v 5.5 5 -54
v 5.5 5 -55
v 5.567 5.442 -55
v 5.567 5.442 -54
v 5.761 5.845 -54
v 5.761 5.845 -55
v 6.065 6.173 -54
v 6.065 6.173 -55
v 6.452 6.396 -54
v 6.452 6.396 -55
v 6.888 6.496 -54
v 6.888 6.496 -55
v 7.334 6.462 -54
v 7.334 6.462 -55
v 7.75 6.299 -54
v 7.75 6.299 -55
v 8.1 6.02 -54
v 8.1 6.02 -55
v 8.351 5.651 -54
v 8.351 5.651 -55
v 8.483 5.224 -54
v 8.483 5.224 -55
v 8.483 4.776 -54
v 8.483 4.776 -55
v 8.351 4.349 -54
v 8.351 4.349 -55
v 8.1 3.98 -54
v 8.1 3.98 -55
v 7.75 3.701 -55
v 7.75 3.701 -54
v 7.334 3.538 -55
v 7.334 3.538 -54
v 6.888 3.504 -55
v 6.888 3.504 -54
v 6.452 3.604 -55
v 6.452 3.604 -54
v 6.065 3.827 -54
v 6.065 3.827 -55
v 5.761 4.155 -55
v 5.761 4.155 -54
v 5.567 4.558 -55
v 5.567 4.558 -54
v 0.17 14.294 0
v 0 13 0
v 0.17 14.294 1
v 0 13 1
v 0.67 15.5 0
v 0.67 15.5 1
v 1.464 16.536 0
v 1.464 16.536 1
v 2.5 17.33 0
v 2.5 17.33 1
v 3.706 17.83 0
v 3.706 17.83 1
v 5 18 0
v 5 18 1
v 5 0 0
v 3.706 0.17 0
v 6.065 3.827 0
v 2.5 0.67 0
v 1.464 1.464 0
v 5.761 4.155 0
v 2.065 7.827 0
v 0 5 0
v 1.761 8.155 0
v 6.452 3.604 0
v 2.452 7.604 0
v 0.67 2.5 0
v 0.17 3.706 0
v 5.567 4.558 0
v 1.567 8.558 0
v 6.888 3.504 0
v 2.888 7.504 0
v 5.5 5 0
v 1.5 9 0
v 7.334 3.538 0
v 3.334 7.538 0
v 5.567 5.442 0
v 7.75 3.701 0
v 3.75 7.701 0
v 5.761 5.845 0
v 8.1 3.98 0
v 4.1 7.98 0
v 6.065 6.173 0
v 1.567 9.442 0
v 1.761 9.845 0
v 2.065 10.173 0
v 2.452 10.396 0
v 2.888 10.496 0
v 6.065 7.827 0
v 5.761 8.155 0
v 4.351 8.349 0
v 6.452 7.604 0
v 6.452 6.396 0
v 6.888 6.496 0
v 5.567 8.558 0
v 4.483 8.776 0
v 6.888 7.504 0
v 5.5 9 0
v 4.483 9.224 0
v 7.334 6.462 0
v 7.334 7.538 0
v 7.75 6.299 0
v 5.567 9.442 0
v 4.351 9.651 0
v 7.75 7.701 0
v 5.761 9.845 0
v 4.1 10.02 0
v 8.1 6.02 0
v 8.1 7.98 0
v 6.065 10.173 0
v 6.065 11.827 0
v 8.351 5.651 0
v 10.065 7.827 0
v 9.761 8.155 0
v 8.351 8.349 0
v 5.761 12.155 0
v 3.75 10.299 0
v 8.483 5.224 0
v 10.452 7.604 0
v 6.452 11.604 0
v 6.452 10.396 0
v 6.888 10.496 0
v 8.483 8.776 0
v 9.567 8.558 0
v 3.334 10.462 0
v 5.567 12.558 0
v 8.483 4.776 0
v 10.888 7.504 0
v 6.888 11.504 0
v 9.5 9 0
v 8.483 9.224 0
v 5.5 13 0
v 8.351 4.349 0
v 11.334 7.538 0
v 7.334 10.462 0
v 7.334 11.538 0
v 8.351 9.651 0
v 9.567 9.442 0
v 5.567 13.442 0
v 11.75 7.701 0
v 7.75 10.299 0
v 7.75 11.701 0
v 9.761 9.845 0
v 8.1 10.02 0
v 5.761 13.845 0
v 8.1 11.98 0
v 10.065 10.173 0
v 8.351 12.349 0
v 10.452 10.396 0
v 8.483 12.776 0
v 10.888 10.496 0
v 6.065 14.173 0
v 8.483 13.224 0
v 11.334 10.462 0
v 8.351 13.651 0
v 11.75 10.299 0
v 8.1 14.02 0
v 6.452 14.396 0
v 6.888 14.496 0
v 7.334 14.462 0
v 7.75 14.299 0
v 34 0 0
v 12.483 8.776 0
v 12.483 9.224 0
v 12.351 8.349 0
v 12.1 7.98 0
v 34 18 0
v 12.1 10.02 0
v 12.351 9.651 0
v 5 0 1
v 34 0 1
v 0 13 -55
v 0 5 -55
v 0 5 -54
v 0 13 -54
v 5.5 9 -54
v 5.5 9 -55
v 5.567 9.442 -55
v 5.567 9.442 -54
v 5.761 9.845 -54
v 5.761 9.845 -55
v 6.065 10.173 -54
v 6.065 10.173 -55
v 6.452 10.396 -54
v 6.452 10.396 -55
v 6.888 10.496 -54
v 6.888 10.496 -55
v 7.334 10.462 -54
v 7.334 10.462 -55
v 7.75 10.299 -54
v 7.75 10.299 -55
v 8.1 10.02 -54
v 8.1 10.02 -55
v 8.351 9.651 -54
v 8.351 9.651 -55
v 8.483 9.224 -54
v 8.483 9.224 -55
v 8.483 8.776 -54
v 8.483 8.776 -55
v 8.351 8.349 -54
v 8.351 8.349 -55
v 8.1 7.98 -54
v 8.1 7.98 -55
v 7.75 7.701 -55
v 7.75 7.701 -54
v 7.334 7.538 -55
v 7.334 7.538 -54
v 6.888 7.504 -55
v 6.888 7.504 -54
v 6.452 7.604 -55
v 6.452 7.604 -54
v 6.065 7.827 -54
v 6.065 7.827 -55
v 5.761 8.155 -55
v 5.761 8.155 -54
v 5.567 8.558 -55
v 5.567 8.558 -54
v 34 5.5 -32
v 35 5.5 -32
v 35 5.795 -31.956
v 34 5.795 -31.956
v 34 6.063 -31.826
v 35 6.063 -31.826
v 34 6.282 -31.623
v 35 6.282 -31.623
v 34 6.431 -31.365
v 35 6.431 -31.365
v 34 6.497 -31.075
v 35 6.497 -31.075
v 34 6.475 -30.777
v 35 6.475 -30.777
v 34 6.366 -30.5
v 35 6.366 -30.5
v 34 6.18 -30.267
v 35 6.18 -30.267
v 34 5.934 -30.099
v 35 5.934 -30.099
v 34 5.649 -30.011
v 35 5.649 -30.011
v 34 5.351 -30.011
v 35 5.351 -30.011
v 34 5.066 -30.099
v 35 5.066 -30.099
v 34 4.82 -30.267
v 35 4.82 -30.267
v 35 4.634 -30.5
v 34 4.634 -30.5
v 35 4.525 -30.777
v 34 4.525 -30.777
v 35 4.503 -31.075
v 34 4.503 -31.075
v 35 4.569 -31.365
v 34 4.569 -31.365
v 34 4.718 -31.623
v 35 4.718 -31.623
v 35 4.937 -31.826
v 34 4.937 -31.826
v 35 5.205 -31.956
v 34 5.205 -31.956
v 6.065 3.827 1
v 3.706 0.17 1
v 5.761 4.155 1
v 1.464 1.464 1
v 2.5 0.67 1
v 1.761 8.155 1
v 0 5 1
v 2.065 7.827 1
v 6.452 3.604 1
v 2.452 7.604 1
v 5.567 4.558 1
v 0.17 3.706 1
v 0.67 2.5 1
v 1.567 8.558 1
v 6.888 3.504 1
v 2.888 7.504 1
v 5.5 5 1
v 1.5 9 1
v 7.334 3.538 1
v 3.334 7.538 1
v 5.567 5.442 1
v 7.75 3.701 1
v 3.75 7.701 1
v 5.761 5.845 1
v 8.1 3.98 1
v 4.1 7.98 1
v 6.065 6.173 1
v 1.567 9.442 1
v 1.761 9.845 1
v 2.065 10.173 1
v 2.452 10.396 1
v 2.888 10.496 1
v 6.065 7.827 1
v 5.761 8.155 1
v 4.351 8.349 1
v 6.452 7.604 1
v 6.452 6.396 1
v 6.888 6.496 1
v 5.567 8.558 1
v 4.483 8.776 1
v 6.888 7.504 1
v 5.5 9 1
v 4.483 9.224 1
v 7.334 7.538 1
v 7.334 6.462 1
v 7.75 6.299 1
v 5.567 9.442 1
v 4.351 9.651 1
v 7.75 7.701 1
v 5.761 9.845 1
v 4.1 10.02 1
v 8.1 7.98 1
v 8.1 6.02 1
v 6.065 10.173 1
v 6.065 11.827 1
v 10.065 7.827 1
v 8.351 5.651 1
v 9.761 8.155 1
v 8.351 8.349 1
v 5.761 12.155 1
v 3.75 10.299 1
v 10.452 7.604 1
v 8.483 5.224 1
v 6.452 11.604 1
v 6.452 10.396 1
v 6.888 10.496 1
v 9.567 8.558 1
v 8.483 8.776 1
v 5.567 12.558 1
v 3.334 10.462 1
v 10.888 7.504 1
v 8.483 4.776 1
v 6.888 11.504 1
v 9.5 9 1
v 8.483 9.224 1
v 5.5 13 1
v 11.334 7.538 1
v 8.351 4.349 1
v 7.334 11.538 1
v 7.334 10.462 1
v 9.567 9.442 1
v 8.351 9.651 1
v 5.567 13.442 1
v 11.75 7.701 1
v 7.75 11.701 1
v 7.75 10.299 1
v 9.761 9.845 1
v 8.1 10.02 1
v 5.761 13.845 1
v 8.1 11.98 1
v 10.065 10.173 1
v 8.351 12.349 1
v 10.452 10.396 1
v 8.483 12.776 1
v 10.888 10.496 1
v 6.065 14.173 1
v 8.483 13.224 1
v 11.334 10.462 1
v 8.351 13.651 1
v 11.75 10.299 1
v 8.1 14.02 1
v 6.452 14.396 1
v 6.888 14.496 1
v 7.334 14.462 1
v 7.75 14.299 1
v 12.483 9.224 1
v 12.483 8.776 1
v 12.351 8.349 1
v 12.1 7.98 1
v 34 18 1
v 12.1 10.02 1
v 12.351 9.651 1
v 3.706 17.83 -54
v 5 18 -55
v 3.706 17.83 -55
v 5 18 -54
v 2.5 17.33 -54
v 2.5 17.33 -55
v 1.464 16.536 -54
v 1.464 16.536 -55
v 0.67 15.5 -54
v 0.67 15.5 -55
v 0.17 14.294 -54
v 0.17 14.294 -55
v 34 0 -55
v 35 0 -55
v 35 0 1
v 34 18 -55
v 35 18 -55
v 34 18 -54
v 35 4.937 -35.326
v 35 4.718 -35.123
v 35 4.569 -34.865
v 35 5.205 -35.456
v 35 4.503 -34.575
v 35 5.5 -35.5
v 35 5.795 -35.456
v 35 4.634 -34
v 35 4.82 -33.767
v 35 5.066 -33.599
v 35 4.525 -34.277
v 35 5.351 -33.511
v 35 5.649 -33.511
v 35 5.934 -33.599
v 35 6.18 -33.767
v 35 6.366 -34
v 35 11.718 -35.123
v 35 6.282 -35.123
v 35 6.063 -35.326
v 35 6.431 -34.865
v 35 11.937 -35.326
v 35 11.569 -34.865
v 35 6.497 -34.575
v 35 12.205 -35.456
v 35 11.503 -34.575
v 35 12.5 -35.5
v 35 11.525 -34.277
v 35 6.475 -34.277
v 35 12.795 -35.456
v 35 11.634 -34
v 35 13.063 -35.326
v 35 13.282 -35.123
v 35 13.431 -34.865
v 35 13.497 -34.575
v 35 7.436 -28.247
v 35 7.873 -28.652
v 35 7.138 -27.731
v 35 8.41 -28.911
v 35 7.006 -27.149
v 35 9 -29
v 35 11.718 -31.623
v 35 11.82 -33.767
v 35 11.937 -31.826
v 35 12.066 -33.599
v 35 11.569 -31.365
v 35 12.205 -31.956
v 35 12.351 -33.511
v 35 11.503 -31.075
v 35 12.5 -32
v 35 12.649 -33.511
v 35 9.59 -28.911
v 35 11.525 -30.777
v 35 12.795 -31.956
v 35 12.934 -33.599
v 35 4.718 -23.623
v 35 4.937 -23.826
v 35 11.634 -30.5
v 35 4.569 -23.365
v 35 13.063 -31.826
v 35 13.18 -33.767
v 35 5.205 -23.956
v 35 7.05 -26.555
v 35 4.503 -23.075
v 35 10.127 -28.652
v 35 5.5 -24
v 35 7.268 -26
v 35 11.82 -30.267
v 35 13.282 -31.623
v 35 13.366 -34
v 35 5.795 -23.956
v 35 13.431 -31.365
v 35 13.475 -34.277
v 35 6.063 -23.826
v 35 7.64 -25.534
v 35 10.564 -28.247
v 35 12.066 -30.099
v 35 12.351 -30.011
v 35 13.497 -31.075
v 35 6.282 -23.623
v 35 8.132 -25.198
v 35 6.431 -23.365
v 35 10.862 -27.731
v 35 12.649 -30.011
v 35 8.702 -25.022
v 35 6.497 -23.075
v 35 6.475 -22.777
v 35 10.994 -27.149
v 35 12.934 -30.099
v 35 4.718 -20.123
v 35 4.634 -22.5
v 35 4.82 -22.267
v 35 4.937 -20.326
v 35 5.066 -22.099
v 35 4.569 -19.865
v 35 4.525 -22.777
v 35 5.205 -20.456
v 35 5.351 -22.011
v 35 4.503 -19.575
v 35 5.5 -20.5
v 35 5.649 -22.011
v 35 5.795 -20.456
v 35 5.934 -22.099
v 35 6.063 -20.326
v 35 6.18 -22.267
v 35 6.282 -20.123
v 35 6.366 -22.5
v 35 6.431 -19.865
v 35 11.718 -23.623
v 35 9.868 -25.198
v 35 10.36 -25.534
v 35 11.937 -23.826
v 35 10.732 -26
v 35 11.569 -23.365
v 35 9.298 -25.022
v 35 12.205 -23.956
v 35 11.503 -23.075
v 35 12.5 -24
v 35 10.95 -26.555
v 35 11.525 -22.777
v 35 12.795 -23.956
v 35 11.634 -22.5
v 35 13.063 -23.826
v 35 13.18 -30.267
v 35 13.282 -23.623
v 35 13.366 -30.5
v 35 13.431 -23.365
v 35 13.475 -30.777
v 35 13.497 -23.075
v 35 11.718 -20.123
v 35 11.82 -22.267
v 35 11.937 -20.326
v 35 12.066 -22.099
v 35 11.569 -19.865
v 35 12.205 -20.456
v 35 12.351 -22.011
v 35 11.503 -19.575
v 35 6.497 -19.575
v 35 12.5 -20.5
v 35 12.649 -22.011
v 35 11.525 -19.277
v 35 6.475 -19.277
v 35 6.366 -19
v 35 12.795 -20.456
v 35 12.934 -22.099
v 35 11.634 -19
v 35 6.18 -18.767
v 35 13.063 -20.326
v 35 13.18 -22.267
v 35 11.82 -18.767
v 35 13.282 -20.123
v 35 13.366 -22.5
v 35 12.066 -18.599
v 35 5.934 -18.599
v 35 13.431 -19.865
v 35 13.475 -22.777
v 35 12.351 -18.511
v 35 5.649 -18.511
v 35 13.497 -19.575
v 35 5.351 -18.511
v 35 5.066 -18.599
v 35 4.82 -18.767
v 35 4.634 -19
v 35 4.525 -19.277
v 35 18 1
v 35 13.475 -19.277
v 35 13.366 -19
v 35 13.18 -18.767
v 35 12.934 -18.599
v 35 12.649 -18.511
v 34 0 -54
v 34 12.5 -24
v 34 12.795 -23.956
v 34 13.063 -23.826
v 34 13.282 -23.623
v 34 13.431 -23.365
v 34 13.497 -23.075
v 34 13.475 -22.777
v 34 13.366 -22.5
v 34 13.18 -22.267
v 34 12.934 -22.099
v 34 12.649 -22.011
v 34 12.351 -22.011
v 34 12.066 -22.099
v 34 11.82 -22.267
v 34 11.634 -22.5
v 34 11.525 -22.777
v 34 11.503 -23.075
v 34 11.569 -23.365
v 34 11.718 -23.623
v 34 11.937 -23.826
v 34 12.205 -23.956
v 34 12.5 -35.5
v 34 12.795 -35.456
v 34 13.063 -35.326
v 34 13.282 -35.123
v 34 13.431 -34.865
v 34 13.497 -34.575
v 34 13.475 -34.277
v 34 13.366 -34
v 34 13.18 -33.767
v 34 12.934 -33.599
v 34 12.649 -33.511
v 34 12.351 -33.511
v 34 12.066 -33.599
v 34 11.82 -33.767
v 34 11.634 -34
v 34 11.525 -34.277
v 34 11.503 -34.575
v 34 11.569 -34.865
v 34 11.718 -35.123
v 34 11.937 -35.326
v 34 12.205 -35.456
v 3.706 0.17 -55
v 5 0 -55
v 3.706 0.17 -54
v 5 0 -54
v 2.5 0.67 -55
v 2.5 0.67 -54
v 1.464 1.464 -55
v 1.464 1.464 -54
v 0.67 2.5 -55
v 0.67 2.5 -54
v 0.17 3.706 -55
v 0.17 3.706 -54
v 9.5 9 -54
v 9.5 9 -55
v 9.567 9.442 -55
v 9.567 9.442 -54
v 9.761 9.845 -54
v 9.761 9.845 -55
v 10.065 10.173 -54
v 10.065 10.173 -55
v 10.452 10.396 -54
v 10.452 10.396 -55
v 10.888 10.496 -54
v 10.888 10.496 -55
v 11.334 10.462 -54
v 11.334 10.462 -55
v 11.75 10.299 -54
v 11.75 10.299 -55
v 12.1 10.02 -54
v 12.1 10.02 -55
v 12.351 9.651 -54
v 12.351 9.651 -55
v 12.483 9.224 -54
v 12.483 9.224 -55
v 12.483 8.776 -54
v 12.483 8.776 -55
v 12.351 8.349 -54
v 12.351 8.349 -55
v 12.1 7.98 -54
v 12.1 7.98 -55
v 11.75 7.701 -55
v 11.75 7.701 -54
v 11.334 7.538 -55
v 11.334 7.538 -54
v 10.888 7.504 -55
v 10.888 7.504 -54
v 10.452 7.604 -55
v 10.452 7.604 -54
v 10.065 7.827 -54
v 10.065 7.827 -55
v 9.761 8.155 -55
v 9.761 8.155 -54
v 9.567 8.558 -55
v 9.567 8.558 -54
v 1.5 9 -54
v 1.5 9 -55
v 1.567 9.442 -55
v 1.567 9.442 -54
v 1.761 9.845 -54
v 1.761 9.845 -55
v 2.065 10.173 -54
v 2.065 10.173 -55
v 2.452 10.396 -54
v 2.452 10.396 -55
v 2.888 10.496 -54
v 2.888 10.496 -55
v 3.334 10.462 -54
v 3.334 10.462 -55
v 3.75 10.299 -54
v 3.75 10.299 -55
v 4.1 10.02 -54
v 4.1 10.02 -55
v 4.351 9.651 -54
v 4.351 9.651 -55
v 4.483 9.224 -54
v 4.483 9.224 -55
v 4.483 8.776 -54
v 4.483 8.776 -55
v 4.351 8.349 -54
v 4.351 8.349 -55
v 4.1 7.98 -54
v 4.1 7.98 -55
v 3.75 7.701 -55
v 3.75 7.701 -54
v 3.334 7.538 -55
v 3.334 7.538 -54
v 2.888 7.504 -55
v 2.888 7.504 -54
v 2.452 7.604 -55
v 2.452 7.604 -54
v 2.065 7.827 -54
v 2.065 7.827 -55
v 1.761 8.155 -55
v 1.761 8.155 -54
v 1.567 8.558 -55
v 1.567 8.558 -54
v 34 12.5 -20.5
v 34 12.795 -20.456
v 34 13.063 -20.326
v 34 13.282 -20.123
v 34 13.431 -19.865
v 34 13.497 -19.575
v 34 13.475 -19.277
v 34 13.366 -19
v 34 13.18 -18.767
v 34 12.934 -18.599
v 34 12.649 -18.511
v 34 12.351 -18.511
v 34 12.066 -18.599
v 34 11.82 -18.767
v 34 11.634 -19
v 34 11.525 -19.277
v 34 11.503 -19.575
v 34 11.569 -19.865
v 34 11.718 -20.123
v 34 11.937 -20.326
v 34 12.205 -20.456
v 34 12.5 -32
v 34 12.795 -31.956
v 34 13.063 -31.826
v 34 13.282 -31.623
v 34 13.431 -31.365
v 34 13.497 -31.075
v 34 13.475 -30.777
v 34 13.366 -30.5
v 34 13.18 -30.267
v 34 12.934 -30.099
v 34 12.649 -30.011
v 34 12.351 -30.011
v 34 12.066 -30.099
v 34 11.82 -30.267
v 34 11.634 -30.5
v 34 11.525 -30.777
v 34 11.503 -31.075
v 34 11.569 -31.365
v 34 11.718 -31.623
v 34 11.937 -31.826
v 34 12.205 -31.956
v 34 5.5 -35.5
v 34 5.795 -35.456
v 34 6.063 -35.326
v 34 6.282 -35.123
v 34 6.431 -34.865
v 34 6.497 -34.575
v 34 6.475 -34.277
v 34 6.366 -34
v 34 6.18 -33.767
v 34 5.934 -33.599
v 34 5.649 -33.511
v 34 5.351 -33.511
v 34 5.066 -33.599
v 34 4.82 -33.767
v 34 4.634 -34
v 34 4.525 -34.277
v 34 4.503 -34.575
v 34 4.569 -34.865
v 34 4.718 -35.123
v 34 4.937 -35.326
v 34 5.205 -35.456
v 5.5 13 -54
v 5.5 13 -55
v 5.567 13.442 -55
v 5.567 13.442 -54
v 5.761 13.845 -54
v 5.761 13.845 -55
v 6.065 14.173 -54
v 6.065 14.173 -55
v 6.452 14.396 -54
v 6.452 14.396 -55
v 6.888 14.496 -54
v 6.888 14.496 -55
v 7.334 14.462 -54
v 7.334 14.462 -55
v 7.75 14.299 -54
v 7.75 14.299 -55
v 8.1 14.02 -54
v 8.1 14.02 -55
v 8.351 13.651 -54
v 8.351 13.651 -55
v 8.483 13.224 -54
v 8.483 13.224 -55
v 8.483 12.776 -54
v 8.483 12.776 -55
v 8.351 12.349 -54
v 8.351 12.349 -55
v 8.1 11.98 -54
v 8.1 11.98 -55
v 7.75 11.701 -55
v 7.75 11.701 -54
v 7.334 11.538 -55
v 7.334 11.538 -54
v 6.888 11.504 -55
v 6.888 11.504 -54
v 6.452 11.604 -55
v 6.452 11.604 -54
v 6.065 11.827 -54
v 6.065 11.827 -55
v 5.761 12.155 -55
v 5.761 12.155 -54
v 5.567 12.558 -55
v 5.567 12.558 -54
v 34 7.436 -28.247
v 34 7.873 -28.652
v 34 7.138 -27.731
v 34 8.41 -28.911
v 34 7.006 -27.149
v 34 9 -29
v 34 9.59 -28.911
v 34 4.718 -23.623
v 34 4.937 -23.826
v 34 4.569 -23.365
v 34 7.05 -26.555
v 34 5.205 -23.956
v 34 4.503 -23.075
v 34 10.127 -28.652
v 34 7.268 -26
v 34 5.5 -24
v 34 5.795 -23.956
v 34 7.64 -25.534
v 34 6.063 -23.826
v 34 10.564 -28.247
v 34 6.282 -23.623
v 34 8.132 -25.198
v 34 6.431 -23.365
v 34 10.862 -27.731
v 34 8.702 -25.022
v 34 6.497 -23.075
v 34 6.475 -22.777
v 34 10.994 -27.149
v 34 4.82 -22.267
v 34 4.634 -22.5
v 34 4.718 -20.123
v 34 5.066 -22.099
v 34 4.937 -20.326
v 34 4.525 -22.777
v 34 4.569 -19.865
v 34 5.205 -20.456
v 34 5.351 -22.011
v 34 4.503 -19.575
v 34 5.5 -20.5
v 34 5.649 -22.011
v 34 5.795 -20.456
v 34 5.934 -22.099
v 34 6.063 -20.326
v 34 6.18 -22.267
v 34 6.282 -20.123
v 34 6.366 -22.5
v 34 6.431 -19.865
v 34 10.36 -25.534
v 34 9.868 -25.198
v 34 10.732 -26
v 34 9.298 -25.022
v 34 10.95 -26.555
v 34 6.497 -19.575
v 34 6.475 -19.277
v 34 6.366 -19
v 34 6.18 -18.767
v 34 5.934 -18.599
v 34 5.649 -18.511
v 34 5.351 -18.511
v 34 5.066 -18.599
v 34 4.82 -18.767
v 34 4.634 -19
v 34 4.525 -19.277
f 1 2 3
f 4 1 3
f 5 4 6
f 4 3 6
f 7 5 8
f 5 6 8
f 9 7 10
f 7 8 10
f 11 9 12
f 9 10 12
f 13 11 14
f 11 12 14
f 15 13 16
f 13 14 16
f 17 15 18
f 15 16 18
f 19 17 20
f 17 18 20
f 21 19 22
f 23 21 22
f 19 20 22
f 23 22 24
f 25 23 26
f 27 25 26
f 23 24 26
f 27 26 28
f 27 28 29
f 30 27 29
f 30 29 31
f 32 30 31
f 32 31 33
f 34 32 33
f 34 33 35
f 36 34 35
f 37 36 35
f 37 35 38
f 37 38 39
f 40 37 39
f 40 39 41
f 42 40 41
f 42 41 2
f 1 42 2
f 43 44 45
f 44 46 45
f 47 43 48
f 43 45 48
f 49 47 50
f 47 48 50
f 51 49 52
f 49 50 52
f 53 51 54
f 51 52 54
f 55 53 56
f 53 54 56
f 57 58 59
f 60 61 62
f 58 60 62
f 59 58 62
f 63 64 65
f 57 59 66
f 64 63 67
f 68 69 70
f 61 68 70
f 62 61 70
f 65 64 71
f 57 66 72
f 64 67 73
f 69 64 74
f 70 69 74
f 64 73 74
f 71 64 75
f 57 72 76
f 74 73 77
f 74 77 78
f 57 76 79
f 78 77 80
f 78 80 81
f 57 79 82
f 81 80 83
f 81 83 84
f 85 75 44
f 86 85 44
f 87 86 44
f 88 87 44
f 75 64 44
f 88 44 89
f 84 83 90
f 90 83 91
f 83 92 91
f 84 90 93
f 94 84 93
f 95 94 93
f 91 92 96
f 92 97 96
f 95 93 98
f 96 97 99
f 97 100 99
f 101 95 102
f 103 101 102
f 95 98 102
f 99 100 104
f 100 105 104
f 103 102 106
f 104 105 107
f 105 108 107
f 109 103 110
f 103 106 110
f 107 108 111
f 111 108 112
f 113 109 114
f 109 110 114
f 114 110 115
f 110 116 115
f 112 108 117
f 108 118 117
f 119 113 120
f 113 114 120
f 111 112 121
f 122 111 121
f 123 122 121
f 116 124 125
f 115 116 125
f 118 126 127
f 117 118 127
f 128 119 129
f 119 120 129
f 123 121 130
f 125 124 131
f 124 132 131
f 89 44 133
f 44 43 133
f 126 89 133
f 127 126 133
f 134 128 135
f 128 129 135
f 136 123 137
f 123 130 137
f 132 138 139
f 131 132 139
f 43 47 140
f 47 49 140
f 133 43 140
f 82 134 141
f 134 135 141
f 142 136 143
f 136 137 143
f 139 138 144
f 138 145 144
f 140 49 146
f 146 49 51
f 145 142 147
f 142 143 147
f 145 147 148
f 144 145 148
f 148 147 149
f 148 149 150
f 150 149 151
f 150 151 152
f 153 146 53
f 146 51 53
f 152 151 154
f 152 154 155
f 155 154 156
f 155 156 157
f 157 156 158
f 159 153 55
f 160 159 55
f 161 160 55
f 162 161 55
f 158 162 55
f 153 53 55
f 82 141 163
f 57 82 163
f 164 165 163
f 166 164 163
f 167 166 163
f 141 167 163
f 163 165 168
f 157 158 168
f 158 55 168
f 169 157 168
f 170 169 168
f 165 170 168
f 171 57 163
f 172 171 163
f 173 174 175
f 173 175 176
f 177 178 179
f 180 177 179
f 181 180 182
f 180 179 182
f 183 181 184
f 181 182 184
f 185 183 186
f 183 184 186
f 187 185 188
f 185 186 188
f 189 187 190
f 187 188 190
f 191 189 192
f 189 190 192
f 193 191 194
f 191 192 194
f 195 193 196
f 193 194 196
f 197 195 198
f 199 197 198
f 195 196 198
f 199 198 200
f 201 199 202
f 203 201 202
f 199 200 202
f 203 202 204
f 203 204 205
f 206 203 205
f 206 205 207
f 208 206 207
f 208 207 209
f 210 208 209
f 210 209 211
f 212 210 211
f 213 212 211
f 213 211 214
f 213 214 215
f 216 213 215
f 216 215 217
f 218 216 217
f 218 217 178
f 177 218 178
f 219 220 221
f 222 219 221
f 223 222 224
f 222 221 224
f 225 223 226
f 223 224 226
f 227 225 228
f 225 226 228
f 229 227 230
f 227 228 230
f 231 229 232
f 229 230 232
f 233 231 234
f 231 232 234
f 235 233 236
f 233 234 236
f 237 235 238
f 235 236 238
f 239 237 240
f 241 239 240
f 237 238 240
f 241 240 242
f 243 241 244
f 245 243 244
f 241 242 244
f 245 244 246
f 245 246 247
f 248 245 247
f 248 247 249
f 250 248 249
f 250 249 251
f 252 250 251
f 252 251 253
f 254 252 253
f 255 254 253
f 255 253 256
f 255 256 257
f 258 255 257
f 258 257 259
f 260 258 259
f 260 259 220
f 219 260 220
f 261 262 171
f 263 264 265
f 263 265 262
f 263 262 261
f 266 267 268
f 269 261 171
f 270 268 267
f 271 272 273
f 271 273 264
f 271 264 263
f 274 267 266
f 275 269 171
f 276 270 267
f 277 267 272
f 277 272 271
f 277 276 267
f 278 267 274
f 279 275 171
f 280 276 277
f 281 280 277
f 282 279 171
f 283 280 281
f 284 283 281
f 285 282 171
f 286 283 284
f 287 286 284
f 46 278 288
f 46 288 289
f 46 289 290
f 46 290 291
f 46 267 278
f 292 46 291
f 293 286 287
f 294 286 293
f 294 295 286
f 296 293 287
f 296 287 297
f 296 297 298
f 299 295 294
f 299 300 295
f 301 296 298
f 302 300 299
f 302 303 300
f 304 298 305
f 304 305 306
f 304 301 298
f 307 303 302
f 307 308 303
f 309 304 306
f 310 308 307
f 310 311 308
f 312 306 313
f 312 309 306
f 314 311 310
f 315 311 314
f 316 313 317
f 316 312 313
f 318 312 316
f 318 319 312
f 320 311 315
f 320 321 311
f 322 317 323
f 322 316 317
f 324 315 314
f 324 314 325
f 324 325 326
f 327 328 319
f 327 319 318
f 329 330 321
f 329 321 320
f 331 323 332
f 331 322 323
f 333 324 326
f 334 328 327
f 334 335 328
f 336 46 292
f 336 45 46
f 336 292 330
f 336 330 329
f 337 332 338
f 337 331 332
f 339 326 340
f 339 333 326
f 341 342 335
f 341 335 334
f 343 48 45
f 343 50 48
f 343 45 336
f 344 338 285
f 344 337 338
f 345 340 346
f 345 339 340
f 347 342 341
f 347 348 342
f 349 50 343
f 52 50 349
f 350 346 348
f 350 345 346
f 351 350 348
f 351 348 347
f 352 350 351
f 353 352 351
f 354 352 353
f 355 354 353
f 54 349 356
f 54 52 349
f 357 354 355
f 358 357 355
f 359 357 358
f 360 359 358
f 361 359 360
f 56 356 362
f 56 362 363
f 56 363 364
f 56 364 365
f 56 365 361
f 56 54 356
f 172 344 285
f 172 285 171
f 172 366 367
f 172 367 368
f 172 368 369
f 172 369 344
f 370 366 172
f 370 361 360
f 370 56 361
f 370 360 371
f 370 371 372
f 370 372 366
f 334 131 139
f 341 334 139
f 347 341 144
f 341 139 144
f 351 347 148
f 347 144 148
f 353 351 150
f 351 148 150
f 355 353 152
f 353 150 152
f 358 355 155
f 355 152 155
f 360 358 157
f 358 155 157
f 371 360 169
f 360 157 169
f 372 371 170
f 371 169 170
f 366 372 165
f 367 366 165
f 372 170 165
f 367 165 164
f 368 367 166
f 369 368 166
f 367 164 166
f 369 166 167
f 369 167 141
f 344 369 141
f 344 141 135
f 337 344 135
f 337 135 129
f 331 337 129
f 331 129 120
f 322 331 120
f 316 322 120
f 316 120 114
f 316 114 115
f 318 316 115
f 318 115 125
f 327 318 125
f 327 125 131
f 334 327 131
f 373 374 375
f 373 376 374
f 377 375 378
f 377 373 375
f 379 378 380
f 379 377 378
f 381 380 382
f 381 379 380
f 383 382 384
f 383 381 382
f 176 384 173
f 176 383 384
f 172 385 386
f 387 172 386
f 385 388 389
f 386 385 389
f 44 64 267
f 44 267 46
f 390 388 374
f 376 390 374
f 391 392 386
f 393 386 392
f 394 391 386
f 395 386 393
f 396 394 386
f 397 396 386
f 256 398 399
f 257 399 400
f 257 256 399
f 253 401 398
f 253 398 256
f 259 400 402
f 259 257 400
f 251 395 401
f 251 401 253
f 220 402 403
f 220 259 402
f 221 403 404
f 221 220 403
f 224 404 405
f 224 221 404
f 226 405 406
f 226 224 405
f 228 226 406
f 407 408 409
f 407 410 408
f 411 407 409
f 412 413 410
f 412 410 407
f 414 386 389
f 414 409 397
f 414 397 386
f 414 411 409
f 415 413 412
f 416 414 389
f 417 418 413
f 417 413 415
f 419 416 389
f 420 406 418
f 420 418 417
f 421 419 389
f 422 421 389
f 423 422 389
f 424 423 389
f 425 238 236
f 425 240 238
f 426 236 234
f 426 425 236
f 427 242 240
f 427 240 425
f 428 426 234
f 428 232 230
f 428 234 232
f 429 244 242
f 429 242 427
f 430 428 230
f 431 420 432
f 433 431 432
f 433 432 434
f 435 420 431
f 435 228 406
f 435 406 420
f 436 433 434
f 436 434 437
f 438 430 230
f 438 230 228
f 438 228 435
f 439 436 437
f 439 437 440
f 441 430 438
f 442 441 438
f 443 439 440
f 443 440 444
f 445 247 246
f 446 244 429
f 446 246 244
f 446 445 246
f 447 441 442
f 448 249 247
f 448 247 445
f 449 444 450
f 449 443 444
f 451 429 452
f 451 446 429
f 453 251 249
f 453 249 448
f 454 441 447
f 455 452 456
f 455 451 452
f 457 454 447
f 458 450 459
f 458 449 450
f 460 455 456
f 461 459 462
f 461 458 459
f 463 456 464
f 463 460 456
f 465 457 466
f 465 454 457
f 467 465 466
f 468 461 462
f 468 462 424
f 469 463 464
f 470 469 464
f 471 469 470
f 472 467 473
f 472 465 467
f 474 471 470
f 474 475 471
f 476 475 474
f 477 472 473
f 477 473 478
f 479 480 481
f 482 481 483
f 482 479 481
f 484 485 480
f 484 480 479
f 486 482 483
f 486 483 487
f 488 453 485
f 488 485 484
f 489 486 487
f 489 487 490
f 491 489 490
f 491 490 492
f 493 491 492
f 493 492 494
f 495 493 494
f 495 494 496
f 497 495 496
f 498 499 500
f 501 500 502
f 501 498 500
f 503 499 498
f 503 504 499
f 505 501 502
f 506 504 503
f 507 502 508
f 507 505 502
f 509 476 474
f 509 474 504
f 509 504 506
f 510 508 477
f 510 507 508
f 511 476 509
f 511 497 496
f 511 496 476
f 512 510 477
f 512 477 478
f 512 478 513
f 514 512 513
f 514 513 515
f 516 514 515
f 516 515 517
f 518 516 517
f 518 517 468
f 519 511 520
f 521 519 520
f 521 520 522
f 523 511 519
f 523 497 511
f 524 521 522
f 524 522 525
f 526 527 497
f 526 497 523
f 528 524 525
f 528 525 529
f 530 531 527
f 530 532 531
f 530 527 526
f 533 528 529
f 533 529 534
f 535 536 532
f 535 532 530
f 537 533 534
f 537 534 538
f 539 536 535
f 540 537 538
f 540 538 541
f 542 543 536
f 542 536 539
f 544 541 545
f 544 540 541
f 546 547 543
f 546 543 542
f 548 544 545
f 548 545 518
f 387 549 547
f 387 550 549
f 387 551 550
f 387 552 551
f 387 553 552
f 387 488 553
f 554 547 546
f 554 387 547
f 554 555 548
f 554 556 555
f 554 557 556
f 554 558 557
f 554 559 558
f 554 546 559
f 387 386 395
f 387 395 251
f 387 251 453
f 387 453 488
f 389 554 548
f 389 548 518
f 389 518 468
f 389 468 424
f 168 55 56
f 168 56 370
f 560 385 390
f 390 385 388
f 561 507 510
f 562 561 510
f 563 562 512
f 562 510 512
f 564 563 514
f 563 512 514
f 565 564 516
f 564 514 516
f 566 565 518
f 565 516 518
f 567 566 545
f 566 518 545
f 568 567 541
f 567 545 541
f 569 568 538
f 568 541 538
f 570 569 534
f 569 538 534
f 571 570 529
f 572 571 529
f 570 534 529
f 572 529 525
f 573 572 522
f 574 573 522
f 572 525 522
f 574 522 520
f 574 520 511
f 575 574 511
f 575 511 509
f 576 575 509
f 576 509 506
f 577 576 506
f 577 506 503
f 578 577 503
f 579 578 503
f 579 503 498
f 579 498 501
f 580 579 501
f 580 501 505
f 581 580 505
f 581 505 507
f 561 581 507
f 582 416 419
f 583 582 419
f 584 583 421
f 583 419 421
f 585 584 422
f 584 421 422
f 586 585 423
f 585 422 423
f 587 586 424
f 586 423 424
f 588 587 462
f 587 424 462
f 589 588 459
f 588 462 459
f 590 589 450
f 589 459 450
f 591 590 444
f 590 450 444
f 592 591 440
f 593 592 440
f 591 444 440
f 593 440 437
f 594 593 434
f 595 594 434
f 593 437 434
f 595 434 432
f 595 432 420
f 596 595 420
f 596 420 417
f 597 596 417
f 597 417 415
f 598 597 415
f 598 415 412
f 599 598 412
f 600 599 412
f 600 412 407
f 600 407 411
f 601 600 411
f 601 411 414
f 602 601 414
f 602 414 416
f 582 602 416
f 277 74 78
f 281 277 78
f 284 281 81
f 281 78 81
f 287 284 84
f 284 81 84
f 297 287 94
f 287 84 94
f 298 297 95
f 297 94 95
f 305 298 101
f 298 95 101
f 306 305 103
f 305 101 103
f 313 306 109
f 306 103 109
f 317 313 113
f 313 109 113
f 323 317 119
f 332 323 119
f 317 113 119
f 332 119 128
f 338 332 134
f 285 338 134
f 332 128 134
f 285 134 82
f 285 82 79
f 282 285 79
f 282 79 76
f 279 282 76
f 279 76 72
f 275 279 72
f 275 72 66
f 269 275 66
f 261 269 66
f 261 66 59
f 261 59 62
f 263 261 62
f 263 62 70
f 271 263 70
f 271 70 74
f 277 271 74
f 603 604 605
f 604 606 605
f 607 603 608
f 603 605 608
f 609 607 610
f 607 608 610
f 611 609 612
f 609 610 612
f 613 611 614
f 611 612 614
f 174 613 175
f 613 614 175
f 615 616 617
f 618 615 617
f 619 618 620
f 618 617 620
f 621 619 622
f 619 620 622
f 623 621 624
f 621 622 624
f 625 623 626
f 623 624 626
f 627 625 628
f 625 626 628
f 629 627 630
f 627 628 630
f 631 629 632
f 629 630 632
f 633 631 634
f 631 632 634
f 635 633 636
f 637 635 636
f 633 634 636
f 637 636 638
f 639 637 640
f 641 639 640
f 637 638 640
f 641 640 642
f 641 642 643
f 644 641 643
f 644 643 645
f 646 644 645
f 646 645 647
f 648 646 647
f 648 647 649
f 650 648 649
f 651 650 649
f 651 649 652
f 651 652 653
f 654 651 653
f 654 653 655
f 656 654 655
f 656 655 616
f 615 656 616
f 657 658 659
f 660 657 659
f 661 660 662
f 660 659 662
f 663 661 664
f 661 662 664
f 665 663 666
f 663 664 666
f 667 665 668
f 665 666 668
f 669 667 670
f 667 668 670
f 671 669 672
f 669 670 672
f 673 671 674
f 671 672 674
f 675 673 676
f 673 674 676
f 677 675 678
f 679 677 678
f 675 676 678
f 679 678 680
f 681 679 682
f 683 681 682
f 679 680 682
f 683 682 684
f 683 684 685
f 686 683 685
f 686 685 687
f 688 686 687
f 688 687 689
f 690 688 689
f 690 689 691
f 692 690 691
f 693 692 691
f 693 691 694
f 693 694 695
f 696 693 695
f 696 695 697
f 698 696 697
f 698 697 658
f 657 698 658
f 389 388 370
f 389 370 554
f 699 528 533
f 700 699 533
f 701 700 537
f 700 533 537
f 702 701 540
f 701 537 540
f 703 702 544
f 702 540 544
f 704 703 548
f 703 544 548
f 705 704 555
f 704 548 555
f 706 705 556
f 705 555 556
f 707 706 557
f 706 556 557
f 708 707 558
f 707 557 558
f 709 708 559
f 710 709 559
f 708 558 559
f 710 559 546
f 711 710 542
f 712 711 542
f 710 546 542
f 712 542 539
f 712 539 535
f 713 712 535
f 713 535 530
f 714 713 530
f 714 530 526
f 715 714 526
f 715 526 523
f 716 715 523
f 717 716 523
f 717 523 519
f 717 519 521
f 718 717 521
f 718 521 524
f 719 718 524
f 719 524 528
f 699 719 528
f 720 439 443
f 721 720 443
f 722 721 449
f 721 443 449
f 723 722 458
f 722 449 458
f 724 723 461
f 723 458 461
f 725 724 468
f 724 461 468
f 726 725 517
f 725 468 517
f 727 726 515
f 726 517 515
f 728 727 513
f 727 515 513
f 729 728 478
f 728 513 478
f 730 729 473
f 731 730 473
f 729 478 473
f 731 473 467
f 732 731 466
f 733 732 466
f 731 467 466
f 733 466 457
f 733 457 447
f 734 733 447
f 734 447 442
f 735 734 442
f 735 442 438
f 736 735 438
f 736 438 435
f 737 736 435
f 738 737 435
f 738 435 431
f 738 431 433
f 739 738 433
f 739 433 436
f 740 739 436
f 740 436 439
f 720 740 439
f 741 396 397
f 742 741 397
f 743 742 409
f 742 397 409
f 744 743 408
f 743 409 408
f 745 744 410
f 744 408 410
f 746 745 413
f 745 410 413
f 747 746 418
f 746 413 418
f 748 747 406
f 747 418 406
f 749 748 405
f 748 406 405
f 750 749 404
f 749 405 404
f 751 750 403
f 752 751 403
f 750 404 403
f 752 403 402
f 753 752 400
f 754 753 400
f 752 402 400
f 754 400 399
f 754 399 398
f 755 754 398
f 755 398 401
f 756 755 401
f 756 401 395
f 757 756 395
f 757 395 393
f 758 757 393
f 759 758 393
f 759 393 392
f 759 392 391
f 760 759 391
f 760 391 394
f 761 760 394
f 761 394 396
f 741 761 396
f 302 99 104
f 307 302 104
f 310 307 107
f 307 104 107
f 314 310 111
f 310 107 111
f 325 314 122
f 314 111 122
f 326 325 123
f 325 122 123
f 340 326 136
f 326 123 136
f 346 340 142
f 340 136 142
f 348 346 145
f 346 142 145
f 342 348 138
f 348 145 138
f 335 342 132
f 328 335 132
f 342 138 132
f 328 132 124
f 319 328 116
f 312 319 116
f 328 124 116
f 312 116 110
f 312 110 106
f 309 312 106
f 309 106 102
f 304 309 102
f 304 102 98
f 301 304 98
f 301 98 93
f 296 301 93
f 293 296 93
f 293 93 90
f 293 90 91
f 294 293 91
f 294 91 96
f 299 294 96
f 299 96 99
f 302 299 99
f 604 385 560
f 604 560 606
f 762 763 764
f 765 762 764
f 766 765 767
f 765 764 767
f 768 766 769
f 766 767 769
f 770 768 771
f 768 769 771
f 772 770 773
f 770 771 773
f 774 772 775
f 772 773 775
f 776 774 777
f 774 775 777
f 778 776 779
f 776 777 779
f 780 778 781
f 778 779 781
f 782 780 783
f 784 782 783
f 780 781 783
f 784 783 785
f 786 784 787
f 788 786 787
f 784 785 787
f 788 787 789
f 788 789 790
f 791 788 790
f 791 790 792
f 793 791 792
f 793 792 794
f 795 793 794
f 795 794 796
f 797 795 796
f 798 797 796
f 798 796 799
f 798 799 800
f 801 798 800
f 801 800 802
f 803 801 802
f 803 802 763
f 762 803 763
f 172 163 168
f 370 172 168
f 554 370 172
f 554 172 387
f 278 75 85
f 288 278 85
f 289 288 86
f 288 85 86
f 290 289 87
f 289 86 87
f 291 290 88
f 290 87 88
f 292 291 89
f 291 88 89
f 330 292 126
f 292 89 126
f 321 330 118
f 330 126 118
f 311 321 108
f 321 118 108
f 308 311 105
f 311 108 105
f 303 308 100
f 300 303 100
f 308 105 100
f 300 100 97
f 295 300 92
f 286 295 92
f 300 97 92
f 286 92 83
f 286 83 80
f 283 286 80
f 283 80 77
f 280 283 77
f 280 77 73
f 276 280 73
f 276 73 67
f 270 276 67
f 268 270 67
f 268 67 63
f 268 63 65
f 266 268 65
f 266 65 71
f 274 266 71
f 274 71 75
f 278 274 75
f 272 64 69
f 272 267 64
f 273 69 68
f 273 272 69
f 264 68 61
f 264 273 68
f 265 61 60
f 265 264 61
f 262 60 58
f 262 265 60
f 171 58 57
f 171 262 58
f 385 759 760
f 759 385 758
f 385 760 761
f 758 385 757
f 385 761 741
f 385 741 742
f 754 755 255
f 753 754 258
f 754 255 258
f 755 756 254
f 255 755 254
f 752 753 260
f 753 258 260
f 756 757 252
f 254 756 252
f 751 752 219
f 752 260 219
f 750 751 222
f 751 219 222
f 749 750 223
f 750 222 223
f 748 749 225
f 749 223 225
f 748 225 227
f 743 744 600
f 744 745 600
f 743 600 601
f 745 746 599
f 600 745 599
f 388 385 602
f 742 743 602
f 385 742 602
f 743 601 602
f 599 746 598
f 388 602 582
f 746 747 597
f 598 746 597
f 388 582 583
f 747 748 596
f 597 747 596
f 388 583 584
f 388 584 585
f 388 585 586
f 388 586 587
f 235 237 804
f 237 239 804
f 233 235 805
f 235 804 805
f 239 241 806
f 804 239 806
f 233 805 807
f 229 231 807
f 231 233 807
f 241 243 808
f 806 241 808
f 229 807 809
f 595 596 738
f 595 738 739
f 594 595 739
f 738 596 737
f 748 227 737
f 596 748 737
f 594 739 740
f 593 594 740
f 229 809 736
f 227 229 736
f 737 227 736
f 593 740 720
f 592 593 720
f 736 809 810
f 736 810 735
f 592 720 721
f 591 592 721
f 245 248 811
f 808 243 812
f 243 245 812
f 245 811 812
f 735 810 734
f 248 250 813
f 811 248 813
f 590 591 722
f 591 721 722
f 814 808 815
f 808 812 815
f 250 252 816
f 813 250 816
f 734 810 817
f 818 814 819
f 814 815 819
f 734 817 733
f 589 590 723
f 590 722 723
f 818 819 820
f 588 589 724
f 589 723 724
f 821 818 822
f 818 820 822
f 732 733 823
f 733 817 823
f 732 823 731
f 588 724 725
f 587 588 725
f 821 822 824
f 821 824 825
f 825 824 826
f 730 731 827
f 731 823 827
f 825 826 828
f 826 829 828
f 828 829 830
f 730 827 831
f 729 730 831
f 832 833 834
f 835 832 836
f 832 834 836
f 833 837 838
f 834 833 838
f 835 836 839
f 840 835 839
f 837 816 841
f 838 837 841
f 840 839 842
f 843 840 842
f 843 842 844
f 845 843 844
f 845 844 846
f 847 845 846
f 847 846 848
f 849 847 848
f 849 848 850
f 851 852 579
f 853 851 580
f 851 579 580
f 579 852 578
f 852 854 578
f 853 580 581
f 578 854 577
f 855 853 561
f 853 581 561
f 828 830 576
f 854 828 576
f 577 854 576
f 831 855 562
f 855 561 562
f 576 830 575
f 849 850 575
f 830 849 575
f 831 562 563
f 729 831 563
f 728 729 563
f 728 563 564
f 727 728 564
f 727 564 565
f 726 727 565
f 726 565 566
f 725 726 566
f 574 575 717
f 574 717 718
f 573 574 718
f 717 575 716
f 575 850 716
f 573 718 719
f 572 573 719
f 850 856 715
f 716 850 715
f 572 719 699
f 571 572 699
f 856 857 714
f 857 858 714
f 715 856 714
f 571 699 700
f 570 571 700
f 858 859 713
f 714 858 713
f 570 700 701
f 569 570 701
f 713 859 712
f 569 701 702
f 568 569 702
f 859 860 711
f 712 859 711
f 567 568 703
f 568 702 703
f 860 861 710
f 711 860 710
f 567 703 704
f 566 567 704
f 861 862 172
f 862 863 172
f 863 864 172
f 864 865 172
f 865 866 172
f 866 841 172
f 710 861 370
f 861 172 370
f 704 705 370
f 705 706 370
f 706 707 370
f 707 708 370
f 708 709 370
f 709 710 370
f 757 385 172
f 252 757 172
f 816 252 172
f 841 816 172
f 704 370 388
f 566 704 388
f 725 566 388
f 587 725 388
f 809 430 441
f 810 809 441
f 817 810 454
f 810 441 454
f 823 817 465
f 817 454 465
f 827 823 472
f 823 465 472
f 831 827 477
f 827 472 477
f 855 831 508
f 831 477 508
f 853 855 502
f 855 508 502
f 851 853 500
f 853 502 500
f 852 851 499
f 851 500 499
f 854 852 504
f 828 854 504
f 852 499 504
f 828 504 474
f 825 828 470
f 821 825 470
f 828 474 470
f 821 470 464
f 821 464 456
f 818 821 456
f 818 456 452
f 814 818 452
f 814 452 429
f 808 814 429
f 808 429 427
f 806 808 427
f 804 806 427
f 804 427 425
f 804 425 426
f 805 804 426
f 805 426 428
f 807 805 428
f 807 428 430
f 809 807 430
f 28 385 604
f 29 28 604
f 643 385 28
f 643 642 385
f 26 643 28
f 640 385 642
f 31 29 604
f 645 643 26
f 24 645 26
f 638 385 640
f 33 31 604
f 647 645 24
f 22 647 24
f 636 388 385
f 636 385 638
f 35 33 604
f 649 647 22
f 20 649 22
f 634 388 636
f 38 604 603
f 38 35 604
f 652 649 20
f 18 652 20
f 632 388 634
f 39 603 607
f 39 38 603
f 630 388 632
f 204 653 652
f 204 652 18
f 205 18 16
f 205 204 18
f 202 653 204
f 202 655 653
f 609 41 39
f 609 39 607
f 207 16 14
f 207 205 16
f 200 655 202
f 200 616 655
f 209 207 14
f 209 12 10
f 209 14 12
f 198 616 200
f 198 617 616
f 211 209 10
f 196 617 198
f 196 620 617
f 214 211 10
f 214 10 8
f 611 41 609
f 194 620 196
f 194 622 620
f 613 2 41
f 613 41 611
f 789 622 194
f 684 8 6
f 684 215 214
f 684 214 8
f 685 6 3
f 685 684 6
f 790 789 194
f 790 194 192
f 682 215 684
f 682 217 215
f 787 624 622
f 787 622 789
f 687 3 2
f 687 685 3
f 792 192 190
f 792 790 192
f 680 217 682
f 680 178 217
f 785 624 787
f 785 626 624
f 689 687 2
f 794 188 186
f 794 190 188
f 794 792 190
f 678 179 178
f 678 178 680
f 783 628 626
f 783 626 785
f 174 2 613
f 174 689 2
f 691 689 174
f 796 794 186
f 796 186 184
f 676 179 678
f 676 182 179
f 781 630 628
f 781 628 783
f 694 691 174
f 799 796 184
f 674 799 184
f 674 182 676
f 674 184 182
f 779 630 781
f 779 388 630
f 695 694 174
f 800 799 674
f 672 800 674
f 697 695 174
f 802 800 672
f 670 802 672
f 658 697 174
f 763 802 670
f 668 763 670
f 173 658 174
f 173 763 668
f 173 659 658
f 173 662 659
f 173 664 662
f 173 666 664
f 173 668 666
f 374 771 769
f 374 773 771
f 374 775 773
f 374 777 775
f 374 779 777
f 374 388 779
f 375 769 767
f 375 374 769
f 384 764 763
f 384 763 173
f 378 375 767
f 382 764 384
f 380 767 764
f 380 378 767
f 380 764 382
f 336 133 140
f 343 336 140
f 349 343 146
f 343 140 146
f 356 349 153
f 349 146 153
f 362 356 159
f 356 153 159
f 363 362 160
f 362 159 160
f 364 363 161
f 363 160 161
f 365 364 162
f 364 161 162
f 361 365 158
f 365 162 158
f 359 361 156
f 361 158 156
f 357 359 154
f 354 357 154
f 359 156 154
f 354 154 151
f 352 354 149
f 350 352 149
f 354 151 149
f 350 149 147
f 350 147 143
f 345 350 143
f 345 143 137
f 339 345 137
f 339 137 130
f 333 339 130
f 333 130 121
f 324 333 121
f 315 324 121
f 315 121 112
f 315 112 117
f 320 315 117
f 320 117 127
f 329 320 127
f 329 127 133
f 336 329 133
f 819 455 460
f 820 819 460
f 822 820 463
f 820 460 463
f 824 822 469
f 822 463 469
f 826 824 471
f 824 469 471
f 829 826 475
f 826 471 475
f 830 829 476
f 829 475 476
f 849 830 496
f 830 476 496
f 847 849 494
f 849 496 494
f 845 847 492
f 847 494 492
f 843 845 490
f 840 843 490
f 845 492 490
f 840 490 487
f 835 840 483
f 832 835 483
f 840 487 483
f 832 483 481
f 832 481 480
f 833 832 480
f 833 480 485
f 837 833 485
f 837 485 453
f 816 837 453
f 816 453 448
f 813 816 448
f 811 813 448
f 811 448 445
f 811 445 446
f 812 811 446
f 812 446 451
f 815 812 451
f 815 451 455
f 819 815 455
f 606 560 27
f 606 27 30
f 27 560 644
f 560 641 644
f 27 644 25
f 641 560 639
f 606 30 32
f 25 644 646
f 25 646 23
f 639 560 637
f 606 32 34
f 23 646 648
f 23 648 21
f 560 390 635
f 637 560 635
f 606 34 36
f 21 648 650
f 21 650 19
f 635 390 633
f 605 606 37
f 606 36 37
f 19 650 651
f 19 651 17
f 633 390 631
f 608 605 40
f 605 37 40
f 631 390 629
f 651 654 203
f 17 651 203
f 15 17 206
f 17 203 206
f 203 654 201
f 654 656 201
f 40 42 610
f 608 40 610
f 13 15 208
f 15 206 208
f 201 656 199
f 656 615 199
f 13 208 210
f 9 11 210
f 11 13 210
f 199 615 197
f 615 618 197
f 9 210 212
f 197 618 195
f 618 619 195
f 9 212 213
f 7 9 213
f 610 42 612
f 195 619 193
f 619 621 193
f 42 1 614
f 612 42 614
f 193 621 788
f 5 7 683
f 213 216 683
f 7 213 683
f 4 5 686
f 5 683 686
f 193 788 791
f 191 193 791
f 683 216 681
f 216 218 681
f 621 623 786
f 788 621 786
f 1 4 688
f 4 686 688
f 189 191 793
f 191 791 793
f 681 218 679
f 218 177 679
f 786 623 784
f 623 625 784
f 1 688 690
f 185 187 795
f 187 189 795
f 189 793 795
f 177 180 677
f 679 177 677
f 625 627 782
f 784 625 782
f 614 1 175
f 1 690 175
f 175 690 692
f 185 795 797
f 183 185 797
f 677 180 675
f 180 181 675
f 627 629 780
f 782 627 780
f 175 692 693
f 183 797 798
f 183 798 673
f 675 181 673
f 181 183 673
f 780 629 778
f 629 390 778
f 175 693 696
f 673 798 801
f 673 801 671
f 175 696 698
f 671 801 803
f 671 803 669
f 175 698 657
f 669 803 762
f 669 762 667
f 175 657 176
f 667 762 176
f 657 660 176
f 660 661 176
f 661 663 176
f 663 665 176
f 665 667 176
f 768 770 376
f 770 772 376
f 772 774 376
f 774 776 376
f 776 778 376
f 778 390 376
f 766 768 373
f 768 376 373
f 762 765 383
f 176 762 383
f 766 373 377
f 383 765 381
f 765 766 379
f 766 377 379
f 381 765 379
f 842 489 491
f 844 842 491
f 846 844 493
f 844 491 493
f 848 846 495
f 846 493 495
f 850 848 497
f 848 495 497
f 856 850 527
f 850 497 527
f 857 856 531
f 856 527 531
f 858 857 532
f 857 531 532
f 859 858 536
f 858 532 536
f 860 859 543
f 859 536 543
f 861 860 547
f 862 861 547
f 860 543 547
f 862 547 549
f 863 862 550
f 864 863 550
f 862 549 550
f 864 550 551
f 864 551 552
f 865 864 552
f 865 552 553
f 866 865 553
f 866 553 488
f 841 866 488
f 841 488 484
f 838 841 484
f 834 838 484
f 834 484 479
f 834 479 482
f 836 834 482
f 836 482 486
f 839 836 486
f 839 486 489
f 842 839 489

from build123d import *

# Parameters (mm, degrees)
SKETCH2_W           = 34
SKETCH2_H           = 18
BOSS_EXTRUDE1_DEPTH = 1
SKETCH4_W           = 1
SKETCH4_H           = 18
BOSS_EXTRUDE2_DEPTH = 56
SKETCH5_W           = 34
SKETCH5_H           = 18
BOSS_EXTRUDE3_DEPTH = 1
SKETCH6_R           = 1.5
CUT_EXTRUDE1_DEPTH  = 57
FILLET1_R           = 5
FILLET2_R           = 5
SKETCH7_R           = 2
SKETCH7_R_2         = 1
CUT_EXTRUDE2_DEPTH  = 53


with BuildPart() as part:
    # Sketch2 → Boss-Extrude1 (new body)
    with BuildSketch(Plane.XY):
        with Locations((17, 9)):
            Rectangle(SKETCH2_W, SKETCH2_H)
    extrude(amount=BOSS_EXTRUDE1_DEPTH)


with BuildPart() as body_2:
    # Sketch4 → Boss-Extrude2 (new body)
    with BuildSketch(Plane.XY.offset(1)):
        with Locations((34.5, 9)):
            Rectangle(SKETCH4_W, SKETCH4_H)
    extrude(amount=-BOSS_EXTRUDE2_DEPTH)

    # Sketch7 → Cut-Extrude2 (cut)
    with BuildSketch(Plane(origin=(35, 0, 0), x_dir=(0, 0, -1), z_dir=(1, 0, 0))):
        with Locations((27, 9)):
            Circle(SKETCH7_R)
        with Locations((23, 12.5)):
            Circle(SKETCH7_R_2)
        with Locations((23, 5.5)):
            Circle(SKETCH7_R_2)
        with Locations((31, 12.5)):
            Circle(SKETCH7_R_2)
        with Locations((31, 5.5)):
            Circle(SKETCH7_R_2)
        with Locations((19.5, 12.5)):
            Circle(SKETCH7_R_2)
        with Locations((19.5, 5.5)):
            Circle(SKETCH7_R_2)
        with Locations((34.5, 12.5)):
            Circle(SKETCH7_R_2)
        with Locations((34.5, 5.5)):
            Circle(SKETCH7_R_2)
    extrude(amount=-CUT_EXTRUDE2_DEPTH, mode=Mode.SUBTRACT)


with BuildPart() as body_3:
    # Sketch5 → Boss-Extrude3 (new body)
    with BuildSketch(Plane(origin=(0, 0, -55), x_dir=(-1, 0, 0), z_dir=(0, 0, -1))):
        with Locations((-17, 9)):
            Rectangle(SKETCH5_W, SKETCH5_H)
    extrude(amount=-BOSS_EXTRUDE3_DEPTH)


with BuildPart() as cut_extrude1_tool:
    # Sketch6 → Cut-Extrude1 (new body)
    with BuildSketch(Plane(origin=(0, 0, -55), x_dir=(-1, 0, 0), z_dir=(0, 0, -1))):
        with Locations((-3, 9)):
            Circle(SKETCH6_R)
        with Locations((-7, 9)):
            Circle(SKETCH6_R)
        with Locations((-7, 13)):
            Circle(SKETCH6_R)
        with Locations((-7, 5)):
            Circle(SKETCH6_R)
        with Locations((-11, 9)):
            Circle(SKETCH6_R)
    extrude(amount=-CUT_EXTRUDE1_DEPTH)


with BuildPart() as part_1:
    add(part.part)

    # Cut-Extrude1: cut by cut_extrude1_tool
    add(cut_extrude1_tool.part, mode=Mode.SUBTRACT)

    # Fillet2
    fillet2_edges = [part_1.edges().sort_by_distance(p)[0] for p in [
        (0, 18, 0.5),
        (0, 0, 0.5),
    ]]
    fillet(fillet2_edges, radius=FILLET2_R)


with BuildPart() as body_3_1:
    add(body_3.part)

    # Cut-Extrude1: cut by cut_extrude1_tool
    add(cut_extrude1_tool.part, mode=Mode.SUBTRACT)

    # Fillet1
    fillet1_edges = [body_3_1.edges().sort_by_distance(p)[0] for p in [
        (0, 18, -54.5),
        (0, 0, -54.5),
    ]]
    fillet(fillet1_edges, radius=FILLET1_R)


solid = Compound([body_2.part, part_1.part, body_3_1.part])
